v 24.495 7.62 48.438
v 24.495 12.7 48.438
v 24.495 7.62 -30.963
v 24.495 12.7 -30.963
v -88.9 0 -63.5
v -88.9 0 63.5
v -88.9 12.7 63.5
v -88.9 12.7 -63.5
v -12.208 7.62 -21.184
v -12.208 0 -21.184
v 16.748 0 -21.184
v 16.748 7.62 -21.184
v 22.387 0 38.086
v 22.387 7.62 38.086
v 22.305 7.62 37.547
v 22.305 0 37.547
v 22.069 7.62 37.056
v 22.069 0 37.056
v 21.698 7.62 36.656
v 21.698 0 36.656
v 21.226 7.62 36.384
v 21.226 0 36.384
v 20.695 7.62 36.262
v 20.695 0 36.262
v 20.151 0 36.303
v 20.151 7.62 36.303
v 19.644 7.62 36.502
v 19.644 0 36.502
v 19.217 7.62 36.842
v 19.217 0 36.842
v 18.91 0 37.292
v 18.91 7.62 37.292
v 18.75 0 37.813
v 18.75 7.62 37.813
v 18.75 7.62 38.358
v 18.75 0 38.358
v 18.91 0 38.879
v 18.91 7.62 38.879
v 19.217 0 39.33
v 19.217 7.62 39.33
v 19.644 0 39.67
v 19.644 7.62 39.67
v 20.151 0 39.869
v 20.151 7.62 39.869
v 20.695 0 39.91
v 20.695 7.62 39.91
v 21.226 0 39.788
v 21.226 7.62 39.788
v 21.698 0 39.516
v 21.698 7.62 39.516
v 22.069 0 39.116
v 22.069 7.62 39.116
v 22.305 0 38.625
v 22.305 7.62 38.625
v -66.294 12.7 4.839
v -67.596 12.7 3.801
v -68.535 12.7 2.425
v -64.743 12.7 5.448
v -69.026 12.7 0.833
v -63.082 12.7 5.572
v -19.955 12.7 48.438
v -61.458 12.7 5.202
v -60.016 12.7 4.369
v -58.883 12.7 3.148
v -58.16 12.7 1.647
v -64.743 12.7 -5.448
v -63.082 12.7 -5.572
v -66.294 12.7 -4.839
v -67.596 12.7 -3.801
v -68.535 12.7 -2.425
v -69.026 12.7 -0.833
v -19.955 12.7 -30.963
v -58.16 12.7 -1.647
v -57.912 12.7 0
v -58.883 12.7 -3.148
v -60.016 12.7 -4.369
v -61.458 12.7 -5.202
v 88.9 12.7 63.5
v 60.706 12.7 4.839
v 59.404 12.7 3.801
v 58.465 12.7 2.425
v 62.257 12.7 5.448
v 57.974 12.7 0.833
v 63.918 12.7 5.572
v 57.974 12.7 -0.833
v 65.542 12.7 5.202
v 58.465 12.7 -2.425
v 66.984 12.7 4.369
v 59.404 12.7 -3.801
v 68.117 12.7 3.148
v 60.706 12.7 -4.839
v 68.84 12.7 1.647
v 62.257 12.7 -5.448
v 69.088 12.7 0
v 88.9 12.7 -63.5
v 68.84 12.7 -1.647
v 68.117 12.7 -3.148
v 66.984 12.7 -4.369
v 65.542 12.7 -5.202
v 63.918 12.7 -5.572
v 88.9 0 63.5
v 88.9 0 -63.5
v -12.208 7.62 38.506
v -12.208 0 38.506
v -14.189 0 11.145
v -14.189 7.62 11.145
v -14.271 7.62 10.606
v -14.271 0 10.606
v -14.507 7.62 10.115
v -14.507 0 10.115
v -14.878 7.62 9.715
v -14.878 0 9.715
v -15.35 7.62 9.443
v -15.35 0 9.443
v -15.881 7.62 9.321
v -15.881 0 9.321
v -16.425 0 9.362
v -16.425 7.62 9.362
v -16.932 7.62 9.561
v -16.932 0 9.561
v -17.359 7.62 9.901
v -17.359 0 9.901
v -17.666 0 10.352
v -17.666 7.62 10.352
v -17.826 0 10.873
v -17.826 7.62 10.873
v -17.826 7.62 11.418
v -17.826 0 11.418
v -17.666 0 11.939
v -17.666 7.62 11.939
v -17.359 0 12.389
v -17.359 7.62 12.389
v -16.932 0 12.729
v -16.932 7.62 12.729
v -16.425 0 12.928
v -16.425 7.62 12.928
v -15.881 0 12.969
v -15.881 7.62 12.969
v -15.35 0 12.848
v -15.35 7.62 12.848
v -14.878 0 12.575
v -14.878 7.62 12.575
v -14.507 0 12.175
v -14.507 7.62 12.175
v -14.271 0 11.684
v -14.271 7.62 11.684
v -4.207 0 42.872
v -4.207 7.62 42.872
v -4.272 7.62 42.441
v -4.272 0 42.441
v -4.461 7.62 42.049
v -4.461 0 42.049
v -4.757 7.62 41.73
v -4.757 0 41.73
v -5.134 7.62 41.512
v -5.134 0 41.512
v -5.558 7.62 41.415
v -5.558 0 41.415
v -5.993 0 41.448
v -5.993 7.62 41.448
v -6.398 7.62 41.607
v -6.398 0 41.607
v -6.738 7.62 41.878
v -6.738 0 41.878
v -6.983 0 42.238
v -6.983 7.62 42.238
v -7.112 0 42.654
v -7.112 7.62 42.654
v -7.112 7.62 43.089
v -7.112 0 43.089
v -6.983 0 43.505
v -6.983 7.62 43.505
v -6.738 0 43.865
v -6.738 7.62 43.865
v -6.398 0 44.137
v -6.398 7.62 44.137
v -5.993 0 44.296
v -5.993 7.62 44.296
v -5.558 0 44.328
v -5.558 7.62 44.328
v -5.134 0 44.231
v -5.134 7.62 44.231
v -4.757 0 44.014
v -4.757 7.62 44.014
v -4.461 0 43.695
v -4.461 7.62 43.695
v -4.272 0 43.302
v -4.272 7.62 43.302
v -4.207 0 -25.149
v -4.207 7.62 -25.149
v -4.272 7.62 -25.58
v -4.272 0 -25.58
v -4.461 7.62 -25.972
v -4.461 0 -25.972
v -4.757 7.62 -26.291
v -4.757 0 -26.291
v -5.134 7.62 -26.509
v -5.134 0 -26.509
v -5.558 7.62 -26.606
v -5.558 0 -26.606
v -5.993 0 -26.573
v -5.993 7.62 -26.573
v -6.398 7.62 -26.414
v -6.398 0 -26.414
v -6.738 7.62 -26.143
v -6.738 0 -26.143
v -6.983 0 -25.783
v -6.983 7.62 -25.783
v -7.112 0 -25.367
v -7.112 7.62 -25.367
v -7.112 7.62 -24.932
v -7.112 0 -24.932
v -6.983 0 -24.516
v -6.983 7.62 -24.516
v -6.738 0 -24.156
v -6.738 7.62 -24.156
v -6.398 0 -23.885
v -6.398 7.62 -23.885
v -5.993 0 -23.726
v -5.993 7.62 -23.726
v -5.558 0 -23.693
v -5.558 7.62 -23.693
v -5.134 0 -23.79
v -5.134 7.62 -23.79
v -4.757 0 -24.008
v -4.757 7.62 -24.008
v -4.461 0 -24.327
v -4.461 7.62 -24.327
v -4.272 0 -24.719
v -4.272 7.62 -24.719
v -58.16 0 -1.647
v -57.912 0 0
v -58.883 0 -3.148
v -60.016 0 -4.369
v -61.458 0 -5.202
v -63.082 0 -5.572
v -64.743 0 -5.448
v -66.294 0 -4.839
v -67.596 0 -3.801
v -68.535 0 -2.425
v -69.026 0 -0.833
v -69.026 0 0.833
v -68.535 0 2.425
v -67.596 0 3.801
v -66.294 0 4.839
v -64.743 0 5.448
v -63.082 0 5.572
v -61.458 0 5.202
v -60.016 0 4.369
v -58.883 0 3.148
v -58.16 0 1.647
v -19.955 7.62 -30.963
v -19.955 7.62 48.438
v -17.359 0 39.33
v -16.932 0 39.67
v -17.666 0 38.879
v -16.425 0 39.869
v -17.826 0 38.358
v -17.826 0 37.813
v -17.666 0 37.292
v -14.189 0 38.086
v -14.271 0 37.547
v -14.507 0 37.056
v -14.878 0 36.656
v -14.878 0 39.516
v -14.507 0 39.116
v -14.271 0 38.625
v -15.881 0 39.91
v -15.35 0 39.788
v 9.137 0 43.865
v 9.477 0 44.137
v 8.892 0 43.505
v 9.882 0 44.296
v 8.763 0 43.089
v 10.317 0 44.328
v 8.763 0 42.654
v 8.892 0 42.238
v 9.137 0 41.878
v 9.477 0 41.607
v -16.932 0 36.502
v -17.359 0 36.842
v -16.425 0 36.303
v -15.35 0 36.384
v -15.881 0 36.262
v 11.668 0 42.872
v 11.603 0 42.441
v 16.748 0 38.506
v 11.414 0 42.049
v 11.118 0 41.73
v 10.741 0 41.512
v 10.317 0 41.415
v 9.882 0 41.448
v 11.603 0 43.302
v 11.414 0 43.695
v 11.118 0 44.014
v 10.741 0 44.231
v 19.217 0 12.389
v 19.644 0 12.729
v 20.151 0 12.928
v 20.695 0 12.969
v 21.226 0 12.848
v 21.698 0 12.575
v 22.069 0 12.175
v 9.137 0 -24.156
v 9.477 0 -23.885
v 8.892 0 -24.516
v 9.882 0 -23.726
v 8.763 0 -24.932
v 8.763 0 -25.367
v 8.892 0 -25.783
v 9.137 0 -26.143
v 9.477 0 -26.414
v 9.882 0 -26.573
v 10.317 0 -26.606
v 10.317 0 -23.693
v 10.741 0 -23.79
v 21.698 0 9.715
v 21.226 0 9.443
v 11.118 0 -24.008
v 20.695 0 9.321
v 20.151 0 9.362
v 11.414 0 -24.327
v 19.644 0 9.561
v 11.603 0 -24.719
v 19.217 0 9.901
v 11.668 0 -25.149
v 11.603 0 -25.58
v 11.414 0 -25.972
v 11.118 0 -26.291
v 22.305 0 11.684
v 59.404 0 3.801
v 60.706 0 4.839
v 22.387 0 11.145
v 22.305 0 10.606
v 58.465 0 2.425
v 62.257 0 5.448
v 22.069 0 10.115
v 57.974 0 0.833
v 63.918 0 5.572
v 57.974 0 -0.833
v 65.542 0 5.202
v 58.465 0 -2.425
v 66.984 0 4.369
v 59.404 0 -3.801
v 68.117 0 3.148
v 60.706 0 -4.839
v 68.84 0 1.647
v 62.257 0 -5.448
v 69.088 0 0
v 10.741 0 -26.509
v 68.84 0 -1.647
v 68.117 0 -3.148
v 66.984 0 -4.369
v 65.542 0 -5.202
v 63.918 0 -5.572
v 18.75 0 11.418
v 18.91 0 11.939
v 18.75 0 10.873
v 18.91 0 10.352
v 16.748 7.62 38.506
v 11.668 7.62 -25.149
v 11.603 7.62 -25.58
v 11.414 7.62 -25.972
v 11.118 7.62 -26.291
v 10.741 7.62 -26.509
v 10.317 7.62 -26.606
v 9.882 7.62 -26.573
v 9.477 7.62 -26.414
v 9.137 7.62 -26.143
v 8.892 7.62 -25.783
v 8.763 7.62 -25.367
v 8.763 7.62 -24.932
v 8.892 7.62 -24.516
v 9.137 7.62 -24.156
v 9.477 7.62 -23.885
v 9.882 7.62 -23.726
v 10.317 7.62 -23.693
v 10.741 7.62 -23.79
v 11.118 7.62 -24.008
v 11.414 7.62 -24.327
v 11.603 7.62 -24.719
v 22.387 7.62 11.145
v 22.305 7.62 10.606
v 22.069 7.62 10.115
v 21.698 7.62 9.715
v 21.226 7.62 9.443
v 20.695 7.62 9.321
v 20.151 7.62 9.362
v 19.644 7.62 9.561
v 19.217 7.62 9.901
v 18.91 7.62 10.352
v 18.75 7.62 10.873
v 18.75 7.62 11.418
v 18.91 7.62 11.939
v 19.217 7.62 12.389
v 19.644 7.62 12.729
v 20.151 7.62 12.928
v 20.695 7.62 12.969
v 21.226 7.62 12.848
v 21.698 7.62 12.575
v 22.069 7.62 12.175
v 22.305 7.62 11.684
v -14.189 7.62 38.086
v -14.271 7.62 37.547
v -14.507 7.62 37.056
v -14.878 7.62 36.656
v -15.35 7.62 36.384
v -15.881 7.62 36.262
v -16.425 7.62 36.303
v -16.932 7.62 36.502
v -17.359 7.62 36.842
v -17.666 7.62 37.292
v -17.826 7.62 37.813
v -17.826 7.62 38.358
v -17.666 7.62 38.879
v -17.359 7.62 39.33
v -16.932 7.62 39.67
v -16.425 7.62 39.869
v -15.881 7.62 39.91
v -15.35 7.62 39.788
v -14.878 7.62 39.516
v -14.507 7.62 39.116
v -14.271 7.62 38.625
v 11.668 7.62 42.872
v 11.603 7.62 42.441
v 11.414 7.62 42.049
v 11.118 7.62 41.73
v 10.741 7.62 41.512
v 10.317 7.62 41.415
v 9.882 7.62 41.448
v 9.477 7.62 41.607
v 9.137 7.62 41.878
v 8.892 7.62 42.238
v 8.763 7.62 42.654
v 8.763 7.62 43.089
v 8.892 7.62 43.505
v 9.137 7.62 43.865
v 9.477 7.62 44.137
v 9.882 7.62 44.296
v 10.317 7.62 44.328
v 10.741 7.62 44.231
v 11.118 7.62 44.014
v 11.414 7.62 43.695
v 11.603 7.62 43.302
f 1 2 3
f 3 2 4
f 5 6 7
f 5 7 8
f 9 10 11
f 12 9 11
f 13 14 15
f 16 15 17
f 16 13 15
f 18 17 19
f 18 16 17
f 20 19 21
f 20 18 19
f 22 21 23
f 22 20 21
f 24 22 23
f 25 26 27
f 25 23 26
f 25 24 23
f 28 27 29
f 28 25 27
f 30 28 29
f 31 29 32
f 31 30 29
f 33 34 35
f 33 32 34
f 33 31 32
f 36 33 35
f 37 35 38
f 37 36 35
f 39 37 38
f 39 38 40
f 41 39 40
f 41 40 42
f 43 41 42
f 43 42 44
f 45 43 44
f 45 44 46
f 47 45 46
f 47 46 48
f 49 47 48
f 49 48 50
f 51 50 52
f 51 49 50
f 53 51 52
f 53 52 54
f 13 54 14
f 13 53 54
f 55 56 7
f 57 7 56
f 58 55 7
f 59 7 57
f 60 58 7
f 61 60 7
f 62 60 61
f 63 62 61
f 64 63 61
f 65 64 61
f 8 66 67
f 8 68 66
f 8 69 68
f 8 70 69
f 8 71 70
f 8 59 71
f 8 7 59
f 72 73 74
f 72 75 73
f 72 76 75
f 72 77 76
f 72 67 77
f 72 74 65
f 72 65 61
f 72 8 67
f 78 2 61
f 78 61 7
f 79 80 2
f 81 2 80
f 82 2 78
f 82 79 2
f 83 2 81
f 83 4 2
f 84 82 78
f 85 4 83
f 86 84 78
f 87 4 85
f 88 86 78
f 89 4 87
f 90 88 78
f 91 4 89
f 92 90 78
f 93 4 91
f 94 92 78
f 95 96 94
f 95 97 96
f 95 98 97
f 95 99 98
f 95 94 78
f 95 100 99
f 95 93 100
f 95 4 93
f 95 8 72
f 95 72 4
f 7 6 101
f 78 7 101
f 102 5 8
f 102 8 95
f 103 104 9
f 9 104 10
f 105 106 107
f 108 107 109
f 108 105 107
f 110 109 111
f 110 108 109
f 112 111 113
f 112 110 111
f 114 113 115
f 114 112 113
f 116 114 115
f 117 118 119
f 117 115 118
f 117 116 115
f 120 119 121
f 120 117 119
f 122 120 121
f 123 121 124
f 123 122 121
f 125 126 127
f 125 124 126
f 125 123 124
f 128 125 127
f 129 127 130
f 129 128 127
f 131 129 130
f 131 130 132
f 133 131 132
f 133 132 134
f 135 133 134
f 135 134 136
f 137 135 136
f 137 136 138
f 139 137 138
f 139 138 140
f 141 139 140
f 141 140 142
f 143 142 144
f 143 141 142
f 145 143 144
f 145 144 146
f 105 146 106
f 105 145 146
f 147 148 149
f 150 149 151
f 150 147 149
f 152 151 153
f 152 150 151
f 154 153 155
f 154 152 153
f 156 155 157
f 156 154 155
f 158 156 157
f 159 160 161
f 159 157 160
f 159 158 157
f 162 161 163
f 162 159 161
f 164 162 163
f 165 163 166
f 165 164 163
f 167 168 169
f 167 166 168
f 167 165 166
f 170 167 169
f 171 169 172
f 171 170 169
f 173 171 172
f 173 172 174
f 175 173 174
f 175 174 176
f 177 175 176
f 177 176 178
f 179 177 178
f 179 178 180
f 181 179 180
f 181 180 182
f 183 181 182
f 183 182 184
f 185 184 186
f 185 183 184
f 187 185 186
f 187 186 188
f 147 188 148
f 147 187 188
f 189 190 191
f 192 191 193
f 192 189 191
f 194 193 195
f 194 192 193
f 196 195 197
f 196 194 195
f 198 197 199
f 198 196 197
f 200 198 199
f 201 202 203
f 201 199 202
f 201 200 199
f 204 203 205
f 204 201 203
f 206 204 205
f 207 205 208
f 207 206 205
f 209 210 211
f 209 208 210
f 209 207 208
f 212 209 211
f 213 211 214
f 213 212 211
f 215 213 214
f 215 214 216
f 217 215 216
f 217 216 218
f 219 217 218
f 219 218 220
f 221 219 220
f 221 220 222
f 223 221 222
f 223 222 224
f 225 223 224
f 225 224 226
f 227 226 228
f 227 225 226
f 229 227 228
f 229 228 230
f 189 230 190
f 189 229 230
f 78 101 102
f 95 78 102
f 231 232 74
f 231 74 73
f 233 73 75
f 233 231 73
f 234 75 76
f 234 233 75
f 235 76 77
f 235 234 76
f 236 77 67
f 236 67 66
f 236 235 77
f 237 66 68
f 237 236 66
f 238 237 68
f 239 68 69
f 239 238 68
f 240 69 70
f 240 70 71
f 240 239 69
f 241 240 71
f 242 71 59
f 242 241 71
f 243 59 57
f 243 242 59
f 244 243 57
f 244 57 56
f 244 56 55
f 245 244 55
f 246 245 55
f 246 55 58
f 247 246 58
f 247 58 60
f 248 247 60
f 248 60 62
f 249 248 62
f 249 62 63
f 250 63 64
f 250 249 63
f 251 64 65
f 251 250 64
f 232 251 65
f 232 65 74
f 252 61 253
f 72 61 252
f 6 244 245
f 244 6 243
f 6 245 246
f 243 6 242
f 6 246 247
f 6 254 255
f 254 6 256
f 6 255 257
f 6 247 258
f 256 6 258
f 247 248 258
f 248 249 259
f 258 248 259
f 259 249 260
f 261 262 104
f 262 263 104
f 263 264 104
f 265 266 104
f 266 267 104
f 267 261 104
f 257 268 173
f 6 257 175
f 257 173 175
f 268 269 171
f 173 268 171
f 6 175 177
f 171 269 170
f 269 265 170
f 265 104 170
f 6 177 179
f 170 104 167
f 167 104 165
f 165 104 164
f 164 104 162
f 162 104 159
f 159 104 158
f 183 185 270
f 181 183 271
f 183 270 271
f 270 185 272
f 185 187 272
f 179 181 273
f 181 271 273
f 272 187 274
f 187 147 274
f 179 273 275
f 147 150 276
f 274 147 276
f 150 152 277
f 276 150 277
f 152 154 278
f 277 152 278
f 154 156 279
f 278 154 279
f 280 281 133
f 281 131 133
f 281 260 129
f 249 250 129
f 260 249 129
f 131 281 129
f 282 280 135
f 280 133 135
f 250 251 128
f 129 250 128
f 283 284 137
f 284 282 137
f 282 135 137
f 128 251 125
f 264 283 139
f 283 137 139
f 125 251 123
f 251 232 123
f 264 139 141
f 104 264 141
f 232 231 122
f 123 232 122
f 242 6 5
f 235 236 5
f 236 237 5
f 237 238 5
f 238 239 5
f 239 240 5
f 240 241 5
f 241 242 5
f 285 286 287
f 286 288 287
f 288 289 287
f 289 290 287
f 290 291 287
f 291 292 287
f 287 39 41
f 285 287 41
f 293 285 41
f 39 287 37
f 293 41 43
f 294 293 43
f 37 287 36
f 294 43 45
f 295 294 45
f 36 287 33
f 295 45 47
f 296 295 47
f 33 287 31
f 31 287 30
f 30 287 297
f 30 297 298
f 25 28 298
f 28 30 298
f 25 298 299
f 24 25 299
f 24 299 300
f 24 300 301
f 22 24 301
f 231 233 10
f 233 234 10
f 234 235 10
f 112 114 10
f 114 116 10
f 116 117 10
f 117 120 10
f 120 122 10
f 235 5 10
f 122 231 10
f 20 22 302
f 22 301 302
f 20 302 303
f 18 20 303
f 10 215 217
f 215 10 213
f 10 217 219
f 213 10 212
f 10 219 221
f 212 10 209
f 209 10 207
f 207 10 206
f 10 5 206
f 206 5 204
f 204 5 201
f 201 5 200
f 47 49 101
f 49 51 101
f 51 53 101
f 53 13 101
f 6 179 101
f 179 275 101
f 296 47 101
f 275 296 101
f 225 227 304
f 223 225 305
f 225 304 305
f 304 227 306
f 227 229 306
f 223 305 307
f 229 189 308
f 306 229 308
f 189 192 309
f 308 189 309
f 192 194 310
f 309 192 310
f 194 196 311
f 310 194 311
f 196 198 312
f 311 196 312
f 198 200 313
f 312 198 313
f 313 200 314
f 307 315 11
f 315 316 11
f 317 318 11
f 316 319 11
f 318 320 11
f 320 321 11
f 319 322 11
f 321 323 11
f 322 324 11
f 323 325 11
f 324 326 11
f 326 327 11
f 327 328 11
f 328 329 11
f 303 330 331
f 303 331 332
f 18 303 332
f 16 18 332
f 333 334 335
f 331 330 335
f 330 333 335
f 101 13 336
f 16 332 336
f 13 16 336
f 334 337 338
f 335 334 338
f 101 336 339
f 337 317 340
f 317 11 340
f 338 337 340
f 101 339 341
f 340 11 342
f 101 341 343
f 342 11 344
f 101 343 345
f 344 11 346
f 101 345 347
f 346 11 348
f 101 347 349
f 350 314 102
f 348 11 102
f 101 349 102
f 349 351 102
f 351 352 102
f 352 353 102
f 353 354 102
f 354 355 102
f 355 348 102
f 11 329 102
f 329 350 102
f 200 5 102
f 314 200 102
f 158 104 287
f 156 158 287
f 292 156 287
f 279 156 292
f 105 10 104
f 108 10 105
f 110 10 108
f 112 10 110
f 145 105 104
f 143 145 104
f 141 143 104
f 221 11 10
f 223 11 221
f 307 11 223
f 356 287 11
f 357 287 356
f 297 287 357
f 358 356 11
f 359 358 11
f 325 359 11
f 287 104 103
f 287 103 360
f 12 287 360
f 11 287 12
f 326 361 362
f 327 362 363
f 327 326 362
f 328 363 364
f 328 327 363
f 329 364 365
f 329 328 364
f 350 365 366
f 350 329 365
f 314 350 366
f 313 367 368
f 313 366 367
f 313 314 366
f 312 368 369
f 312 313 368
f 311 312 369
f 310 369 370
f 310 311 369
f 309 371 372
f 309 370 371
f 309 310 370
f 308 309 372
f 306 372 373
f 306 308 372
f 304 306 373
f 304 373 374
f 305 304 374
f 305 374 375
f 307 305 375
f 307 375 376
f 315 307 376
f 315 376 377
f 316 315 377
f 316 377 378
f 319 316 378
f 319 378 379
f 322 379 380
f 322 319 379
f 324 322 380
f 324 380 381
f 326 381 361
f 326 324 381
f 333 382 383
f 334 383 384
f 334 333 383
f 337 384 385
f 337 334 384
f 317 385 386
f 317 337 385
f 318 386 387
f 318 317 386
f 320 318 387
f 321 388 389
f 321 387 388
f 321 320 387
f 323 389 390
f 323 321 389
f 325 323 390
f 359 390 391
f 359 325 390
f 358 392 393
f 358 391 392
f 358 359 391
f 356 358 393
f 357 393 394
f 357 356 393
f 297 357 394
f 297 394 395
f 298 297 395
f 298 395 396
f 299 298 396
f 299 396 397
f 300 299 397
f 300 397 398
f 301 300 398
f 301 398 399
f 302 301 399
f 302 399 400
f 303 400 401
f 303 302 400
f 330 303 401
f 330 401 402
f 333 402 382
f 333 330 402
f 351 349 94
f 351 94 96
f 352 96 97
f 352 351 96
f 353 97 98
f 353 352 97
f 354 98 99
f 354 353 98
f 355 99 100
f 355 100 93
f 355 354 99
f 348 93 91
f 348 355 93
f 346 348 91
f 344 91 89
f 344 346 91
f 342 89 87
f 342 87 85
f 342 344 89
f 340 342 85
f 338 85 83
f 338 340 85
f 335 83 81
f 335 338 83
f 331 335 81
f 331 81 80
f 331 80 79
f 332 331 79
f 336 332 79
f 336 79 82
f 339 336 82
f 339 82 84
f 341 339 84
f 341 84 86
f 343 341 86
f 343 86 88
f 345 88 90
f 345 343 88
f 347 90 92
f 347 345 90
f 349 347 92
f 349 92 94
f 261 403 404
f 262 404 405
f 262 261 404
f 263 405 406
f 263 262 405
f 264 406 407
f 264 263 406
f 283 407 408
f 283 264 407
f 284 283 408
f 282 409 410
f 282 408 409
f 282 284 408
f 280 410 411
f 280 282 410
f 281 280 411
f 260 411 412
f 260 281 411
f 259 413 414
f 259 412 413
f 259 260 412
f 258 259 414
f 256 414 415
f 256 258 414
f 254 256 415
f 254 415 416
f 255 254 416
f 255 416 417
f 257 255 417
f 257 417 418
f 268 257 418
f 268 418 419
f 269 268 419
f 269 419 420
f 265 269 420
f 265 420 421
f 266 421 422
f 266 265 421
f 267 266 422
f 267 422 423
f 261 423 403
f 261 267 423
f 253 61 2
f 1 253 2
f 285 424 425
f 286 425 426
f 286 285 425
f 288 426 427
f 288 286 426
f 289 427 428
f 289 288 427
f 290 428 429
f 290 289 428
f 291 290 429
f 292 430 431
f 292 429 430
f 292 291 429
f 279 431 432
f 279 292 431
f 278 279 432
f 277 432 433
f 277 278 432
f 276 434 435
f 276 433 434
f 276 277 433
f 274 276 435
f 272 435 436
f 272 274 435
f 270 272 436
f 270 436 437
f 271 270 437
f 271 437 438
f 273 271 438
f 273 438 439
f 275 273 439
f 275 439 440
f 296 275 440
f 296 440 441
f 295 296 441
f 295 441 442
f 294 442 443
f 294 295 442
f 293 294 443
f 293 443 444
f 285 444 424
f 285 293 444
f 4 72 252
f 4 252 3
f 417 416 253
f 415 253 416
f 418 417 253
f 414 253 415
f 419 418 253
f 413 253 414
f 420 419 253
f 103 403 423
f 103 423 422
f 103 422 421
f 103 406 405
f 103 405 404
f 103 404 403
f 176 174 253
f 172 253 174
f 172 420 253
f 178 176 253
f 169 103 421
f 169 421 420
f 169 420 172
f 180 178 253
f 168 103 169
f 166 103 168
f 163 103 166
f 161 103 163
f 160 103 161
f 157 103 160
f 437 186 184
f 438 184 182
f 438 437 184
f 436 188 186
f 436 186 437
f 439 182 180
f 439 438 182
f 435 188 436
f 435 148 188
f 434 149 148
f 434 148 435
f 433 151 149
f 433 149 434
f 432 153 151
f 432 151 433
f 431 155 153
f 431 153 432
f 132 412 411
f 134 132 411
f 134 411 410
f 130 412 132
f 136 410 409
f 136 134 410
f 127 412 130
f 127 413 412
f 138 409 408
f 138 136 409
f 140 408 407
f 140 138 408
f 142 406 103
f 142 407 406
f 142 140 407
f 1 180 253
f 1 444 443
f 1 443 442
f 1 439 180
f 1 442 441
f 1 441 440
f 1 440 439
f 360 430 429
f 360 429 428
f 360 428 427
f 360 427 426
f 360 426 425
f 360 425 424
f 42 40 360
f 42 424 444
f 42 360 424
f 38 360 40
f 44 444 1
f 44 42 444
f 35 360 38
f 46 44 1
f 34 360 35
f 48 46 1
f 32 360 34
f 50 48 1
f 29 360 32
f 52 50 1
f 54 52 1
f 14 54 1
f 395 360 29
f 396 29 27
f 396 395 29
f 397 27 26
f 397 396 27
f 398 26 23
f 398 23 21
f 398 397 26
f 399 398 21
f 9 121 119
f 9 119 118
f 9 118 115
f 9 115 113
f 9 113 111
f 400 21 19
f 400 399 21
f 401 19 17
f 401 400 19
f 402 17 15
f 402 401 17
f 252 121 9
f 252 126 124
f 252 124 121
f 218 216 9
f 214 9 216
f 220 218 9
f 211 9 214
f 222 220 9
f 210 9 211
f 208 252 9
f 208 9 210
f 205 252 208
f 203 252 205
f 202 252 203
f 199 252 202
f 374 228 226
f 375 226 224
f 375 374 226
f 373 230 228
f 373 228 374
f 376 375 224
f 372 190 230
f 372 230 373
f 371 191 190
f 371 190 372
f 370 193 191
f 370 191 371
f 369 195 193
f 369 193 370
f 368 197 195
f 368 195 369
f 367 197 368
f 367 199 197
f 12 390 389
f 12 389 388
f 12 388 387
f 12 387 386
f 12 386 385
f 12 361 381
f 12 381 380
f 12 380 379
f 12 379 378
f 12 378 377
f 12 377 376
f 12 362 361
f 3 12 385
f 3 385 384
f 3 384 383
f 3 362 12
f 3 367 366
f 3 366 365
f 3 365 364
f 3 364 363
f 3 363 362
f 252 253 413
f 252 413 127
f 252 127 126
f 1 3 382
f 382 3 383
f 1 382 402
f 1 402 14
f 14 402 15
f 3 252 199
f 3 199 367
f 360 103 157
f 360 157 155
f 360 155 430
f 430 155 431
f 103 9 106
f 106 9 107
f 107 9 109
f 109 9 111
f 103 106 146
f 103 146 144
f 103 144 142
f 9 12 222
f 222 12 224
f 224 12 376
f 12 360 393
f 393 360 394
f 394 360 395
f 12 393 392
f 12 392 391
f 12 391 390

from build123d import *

# Parameters (mm, degrees)
SKETCH1_W           = 177.8
SKETCH1_H           = 127
SKETCH1_R           = 5.588
SKETCH1_R_2         = 1.8288
SKETCH1_R_3         = 1.4605
SKETCH1_W_2         = 28.956
SKETCH1_H_2         = 59.69
BOSS_EXTRUDE1_DEPTH = 12.7
SKETCH2_W           = 44.45
SKETCH2_H           = 79.4004
CUT_EXTRUDE1_DEPTH  = 5.08


with BuildPart() as part:
    # Sketch1 → Boss-Extrude1 (new body)
    with BuildSketch(Plane(origin=(0, 0, 0), x_dir=(1, 0, 0), z_dir=(0, 1, 0))):
        Rectangle(SKETCH1_W, SKETCH1_H)
        with Locations((-63.5, 0)):
            Circle(SKETCH1_R, mode=Mode.SUBTRACT)
        with Locations((63.5, 0)):
            Circle(SKETCH1_R, mode=Mode.SUBTRACT)
        with Locations((20.557934463, -38.085909964)):
            Circle(SKETCH1_R_2, mode=Mode.SUBTRACT)
        with Locations((-16.018065537, -38.085909964)):
            Circle(SKETCH1_R_2, mode=Mode.SUBTRACT)
        with Locations((-16.018065537, -11.145141601)):
            Circle(SKETCH1_R_2, mode=Mode.SUBTRACT)
        with Locations((20.557934463, -11.145141601)):
            Circle(SKETCH1_R_2, mode=Mode.SUBTRACT)
        with Locations((-5.667565537, -42.871775783)):
            Circle(SKETCH1_R_3, mode=Mode.SUBTRACT)
        with Locations((10.207434463, -42.871775783)):
            Circle(SKETCH1_R_3, mode=Mode.SUBTRACT)
        with Locations((-5.667565537, 25.149424217)):
            Circle(SKETCH1_R_3, mode=Mode.SUBTRACT)
        with Locations((10.207434463, 25.149424217)):
            Circle(SKETCH1_R_3, mode=Mode.SUBTRACT)
        with Locations((2.269934463, -8.661150783)):
            Rectangle(SKETCH1_W_2, SKETCH1_H_2, mode=Mode.SUBTRACT)
    extrude(amount=BOSS_EXTRUDE1_DEPTH)

    # Sketch2 → Cut-Extrude1 (cut)
    with BuildSketch(Plane(origin=(0, 12.7, 0), x_dir=(1, 0, 0), z_dir=(0, 1, 0))):
        with Locations((2.269934463, -8.737350783)):
            Rectangle(SKETCH2_W, SKETCH2_H)
    extrude(amount=-CUT_EXTRUDE1_DEPTH, mode=Mode.SUBTRACT)


solid = part.part
